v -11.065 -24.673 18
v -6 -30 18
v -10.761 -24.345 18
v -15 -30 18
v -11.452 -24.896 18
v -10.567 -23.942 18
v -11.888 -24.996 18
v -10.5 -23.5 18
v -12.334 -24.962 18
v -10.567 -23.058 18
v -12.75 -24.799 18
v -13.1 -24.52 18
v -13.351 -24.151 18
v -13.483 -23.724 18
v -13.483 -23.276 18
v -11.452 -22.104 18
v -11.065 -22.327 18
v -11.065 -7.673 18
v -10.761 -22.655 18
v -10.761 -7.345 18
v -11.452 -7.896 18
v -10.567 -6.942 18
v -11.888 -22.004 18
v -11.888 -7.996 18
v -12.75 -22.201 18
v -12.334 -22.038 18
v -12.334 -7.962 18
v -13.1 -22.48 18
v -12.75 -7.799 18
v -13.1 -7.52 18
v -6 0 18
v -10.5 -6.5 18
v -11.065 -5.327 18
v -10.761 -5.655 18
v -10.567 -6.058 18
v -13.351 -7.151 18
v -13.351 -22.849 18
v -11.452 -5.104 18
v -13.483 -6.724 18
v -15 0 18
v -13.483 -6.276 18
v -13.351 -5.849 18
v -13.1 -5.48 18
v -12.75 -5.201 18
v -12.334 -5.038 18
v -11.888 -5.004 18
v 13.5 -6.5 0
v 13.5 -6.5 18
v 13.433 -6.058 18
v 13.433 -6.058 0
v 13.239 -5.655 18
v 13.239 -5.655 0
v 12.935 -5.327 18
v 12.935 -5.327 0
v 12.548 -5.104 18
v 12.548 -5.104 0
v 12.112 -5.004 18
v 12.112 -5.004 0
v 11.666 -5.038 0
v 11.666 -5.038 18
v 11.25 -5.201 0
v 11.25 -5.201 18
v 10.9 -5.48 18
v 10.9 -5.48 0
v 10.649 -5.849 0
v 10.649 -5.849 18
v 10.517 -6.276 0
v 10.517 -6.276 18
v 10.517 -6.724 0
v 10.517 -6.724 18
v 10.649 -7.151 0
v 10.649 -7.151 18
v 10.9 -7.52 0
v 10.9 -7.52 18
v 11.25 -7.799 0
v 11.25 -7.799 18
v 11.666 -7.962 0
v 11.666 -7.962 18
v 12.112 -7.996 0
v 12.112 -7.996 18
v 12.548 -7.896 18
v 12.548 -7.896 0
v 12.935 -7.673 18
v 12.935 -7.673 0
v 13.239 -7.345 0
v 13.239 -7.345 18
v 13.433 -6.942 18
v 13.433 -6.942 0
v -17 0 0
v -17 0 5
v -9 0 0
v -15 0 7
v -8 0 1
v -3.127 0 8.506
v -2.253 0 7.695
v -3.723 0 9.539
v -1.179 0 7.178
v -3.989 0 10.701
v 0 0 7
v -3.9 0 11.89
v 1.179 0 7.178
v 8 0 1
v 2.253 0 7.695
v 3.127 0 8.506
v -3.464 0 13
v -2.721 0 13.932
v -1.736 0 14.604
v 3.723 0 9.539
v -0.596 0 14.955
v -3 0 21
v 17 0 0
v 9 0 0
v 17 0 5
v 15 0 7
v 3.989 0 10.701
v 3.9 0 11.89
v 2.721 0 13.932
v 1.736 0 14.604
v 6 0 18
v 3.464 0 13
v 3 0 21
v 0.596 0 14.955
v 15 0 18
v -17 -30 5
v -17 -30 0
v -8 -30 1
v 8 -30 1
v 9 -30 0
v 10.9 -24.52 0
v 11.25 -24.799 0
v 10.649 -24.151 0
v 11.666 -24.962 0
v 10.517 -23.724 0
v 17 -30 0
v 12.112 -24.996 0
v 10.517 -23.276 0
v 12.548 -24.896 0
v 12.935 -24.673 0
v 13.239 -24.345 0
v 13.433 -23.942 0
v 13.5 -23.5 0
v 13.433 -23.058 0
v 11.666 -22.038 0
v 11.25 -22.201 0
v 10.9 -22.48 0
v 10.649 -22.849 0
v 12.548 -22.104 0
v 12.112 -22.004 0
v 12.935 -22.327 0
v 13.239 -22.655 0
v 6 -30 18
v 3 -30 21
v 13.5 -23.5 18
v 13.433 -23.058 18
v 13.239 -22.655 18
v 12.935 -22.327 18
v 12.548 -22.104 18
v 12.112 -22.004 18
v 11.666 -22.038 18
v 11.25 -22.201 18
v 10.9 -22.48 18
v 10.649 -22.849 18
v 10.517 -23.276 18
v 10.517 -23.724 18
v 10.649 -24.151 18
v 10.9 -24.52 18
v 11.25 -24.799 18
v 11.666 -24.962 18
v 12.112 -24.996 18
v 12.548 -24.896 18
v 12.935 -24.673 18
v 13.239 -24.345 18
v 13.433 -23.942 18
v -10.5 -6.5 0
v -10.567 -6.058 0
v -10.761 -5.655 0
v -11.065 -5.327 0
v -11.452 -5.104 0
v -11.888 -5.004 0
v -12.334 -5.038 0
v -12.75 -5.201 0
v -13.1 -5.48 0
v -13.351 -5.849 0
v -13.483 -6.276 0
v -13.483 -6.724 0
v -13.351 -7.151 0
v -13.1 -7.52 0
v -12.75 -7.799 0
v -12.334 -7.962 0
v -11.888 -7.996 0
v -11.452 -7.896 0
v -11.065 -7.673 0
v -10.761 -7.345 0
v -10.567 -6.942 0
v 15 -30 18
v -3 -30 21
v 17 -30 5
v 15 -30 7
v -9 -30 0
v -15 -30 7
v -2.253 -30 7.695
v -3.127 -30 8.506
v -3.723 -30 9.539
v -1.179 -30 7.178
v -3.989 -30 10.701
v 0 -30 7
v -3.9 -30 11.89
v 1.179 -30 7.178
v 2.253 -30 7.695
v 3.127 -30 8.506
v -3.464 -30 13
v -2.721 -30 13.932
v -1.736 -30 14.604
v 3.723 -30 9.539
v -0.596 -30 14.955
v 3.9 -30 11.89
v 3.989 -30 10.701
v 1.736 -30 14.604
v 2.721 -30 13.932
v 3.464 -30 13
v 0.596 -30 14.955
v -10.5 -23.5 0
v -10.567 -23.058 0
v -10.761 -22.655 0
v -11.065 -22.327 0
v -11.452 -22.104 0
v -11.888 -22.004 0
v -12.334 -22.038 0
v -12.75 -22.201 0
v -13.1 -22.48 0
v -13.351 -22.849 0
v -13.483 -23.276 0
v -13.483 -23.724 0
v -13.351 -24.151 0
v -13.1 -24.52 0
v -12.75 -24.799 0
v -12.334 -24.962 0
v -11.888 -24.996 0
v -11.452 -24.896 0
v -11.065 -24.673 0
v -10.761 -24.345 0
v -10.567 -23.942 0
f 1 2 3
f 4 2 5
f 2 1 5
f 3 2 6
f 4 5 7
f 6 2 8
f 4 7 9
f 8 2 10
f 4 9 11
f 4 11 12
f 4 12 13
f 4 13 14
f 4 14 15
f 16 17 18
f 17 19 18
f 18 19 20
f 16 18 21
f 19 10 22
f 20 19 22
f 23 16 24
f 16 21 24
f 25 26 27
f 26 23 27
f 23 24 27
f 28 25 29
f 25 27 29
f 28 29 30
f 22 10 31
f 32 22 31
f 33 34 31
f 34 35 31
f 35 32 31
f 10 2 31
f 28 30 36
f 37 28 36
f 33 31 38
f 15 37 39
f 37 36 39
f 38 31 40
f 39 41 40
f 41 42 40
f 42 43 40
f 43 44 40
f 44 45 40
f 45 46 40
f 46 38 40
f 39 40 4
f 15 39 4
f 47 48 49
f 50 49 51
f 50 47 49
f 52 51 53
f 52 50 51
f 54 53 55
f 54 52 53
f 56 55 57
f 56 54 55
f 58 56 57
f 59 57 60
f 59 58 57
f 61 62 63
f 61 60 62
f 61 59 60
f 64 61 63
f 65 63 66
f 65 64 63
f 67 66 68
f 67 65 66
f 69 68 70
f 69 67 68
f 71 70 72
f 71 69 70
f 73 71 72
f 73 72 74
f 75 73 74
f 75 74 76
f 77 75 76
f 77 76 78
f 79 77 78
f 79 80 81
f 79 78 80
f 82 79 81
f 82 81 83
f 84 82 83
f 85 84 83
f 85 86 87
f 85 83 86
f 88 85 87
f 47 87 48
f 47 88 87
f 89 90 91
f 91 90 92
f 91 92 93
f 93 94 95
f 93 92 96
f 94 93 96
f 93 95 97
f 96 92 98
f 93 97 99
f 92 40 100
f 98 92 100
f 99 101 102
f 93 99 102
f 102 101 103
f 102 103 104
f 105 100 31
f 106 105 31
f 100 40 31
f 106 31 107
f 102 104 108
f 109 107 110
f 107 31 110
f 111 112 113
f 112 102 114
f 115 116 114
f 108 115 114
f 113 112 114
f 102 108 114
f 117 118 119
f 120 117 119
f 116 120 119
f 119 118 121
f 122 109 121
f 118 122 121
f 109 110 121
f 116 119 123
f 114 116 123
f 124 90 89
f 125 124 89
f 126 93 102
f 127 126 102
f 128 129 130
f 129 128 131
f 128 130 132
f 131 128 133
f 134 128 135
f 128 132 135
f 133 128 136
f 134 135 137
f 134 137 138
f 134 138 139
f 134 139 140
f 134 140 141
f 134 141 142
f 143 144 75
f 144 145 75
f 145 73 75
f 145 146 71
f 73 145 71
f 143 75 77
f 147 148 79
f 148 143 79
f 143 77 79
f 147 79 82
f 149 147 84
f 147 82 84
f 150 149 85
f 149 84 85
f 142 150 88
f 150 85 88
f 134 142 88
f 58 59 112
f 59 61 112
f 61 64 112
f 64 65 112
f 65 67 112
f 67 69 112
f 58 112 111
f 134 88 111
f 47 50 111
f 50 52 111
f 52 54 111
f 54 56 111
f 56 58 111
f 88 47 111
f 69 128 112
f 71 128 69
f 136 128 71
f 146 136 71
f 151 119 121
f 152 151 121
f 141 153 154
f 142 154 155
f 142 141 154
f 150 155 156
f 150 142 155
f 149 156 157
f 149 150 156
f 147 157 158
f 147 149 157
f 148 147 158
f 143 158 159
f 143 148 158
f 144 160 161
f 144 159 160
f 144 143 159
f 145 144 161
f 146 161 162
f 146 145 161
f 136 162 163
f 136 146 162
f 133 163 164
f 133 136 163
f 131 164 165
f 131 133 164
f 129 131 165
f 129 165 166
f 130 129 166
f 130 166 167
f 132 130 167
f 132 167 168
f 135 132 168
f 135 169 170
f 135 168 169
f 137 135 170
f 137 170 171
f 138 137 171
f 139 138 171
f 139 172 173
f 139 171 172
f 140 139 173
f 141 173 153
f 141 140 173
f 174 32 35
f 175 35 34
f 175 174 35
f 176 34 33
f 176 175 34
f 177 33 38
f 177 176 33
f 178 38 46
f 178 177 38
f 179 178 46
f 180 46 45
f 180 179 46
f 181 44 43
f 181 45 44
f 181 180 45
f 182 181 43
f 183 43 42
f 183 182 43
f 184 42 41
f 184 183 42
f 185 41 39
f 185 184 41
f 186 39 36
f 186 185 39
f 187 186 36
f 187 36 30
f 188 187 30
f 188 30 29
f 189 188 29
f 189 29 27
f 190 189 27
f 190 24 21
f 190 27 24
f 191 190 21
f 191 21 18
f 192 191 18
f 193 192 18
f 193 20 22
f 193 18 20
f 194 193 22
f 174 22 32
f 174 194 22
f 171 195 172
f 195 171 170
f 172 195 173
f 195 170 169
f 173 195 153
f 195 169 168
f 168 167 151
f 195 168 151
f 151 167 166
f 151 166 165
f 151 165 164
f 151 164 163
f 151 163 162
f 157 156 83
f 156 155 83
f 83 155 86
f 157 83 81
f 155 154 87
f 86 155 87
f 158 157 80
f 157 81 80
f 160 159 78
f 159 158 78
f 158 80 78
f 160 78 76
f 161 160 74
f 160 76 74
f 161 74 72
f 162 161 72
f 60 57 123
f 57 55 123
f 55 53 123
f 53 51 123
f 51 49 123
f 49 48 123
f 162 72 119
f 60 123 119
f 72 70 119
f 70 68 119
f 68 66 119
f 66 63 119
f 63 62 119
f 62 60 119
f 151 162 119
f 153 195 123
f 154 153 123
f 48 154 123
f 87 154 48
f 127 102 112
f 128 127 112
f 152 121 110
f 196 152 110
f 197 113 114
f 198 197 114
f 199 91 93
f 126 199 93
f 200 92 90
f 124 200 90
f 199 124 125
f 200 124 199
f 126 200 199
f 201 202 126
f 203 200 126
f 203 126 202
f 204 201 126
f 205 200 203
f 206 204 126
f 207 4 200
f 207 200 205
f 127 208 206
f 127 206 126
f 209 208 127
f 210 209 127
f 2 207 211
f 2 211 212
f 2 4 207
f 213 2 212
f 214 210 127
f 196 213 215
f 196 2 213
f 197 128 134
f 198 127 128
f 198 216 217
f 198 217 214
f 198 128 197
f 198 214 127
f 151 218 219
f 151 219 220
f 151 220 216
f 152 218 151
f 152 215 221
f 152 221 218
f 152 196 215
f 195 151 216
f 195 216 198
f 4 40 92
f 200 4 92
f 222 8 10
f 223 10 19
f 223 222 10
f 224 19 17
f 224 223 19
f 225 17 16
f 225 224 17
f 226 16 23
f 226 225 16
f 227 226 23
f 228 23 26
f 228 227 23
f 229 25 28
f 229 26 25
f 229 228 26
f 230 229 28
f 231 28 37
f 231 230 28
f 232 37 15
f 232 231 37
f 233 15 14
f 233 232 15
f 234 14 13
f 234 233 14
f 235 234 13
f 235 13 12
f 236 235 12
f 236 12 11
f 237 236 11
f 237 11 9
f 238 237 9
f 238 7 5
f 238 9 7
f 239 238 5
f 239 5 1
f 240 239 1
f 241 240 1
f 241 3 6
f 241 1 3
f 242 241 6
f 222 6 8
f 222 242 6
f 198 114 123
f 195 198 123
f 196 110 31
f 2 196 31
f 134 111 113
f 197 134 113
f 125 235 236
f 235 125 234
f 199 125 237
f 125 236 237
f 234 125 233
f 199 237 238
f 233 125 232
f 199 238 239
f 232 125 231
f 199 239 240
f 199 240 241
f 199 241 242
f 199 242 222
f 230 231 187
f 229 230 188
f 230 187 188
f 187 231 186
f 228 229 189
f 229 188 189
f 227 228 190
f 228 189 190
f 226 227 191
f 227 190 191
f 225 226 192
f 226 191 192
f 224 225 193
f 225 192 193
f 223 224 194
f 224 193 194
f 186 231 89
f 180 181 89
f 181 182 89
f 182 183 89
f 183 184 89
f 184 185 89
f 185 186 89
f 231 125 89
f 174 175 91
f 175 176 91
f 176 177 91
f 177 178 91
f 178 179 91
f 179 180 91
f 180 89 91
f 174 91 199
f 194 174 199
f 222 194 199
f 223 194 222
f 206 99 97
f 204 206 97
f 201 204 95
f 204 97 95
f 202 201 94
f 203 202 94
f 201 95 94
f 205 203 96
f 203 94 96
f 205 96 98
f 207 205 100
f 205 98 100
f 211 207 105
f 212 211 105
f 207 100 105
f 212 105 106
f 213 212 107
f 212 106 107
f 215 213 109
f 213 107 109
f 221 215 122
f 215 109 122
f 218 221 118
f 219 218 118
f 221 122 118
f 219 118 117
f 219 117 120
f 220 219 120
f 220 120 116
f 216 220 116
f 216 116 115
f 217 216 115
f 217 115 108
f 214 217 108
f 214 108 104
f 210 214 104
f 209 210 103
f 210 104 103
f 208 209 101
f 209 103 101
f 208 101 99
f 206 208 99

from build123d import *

# Parameters (mm, degrees)
F1_DEPTH = 30
F2_R     = 1.5
F3_DEPTH = 21.001


with BuildPart() as f1:
    # F0 (on Front) → F1 (new body)
    with BuildSketch(Plane.XZ):
        Polygon((-8, 1), (0, 1), (8, 1), (9, 0), (17, 0), (17, 5), (15, 7), (15, 18), (6, 18), (3, 21), (0, 21), (-3, 21), (-6, 18), (-15, 18), (-15, 7), (-17, 5), (-17, 0), (-9, 0), align=None)
        with BuildLine():
            ThreePointArc((0, 15), (4, 11), (0, 7))
            ThreePointArc((0, 7), (-4, 11), (0, 15))
        make_face(mode=Mode.SUBTRACT)
    extrude(amount=F1_DEPTH)

    # F2 (on Top) → F3 (cut, through all)
    with BuildSketch(Plane.XY):
        with Locations((-12, -6.5)):
            Circle(F2_R)
        with Locations((-12, -23.5)):
            Circle(F2_R)
        with Locations((12, -23.5)):
            Circle(F2_R)
        with Locations((12, -6.5)):
            Circle(F2_R)
    extrude(amount=F3_DEPTH, mode=Mode.SUBTRACT)


solid = f1.part
